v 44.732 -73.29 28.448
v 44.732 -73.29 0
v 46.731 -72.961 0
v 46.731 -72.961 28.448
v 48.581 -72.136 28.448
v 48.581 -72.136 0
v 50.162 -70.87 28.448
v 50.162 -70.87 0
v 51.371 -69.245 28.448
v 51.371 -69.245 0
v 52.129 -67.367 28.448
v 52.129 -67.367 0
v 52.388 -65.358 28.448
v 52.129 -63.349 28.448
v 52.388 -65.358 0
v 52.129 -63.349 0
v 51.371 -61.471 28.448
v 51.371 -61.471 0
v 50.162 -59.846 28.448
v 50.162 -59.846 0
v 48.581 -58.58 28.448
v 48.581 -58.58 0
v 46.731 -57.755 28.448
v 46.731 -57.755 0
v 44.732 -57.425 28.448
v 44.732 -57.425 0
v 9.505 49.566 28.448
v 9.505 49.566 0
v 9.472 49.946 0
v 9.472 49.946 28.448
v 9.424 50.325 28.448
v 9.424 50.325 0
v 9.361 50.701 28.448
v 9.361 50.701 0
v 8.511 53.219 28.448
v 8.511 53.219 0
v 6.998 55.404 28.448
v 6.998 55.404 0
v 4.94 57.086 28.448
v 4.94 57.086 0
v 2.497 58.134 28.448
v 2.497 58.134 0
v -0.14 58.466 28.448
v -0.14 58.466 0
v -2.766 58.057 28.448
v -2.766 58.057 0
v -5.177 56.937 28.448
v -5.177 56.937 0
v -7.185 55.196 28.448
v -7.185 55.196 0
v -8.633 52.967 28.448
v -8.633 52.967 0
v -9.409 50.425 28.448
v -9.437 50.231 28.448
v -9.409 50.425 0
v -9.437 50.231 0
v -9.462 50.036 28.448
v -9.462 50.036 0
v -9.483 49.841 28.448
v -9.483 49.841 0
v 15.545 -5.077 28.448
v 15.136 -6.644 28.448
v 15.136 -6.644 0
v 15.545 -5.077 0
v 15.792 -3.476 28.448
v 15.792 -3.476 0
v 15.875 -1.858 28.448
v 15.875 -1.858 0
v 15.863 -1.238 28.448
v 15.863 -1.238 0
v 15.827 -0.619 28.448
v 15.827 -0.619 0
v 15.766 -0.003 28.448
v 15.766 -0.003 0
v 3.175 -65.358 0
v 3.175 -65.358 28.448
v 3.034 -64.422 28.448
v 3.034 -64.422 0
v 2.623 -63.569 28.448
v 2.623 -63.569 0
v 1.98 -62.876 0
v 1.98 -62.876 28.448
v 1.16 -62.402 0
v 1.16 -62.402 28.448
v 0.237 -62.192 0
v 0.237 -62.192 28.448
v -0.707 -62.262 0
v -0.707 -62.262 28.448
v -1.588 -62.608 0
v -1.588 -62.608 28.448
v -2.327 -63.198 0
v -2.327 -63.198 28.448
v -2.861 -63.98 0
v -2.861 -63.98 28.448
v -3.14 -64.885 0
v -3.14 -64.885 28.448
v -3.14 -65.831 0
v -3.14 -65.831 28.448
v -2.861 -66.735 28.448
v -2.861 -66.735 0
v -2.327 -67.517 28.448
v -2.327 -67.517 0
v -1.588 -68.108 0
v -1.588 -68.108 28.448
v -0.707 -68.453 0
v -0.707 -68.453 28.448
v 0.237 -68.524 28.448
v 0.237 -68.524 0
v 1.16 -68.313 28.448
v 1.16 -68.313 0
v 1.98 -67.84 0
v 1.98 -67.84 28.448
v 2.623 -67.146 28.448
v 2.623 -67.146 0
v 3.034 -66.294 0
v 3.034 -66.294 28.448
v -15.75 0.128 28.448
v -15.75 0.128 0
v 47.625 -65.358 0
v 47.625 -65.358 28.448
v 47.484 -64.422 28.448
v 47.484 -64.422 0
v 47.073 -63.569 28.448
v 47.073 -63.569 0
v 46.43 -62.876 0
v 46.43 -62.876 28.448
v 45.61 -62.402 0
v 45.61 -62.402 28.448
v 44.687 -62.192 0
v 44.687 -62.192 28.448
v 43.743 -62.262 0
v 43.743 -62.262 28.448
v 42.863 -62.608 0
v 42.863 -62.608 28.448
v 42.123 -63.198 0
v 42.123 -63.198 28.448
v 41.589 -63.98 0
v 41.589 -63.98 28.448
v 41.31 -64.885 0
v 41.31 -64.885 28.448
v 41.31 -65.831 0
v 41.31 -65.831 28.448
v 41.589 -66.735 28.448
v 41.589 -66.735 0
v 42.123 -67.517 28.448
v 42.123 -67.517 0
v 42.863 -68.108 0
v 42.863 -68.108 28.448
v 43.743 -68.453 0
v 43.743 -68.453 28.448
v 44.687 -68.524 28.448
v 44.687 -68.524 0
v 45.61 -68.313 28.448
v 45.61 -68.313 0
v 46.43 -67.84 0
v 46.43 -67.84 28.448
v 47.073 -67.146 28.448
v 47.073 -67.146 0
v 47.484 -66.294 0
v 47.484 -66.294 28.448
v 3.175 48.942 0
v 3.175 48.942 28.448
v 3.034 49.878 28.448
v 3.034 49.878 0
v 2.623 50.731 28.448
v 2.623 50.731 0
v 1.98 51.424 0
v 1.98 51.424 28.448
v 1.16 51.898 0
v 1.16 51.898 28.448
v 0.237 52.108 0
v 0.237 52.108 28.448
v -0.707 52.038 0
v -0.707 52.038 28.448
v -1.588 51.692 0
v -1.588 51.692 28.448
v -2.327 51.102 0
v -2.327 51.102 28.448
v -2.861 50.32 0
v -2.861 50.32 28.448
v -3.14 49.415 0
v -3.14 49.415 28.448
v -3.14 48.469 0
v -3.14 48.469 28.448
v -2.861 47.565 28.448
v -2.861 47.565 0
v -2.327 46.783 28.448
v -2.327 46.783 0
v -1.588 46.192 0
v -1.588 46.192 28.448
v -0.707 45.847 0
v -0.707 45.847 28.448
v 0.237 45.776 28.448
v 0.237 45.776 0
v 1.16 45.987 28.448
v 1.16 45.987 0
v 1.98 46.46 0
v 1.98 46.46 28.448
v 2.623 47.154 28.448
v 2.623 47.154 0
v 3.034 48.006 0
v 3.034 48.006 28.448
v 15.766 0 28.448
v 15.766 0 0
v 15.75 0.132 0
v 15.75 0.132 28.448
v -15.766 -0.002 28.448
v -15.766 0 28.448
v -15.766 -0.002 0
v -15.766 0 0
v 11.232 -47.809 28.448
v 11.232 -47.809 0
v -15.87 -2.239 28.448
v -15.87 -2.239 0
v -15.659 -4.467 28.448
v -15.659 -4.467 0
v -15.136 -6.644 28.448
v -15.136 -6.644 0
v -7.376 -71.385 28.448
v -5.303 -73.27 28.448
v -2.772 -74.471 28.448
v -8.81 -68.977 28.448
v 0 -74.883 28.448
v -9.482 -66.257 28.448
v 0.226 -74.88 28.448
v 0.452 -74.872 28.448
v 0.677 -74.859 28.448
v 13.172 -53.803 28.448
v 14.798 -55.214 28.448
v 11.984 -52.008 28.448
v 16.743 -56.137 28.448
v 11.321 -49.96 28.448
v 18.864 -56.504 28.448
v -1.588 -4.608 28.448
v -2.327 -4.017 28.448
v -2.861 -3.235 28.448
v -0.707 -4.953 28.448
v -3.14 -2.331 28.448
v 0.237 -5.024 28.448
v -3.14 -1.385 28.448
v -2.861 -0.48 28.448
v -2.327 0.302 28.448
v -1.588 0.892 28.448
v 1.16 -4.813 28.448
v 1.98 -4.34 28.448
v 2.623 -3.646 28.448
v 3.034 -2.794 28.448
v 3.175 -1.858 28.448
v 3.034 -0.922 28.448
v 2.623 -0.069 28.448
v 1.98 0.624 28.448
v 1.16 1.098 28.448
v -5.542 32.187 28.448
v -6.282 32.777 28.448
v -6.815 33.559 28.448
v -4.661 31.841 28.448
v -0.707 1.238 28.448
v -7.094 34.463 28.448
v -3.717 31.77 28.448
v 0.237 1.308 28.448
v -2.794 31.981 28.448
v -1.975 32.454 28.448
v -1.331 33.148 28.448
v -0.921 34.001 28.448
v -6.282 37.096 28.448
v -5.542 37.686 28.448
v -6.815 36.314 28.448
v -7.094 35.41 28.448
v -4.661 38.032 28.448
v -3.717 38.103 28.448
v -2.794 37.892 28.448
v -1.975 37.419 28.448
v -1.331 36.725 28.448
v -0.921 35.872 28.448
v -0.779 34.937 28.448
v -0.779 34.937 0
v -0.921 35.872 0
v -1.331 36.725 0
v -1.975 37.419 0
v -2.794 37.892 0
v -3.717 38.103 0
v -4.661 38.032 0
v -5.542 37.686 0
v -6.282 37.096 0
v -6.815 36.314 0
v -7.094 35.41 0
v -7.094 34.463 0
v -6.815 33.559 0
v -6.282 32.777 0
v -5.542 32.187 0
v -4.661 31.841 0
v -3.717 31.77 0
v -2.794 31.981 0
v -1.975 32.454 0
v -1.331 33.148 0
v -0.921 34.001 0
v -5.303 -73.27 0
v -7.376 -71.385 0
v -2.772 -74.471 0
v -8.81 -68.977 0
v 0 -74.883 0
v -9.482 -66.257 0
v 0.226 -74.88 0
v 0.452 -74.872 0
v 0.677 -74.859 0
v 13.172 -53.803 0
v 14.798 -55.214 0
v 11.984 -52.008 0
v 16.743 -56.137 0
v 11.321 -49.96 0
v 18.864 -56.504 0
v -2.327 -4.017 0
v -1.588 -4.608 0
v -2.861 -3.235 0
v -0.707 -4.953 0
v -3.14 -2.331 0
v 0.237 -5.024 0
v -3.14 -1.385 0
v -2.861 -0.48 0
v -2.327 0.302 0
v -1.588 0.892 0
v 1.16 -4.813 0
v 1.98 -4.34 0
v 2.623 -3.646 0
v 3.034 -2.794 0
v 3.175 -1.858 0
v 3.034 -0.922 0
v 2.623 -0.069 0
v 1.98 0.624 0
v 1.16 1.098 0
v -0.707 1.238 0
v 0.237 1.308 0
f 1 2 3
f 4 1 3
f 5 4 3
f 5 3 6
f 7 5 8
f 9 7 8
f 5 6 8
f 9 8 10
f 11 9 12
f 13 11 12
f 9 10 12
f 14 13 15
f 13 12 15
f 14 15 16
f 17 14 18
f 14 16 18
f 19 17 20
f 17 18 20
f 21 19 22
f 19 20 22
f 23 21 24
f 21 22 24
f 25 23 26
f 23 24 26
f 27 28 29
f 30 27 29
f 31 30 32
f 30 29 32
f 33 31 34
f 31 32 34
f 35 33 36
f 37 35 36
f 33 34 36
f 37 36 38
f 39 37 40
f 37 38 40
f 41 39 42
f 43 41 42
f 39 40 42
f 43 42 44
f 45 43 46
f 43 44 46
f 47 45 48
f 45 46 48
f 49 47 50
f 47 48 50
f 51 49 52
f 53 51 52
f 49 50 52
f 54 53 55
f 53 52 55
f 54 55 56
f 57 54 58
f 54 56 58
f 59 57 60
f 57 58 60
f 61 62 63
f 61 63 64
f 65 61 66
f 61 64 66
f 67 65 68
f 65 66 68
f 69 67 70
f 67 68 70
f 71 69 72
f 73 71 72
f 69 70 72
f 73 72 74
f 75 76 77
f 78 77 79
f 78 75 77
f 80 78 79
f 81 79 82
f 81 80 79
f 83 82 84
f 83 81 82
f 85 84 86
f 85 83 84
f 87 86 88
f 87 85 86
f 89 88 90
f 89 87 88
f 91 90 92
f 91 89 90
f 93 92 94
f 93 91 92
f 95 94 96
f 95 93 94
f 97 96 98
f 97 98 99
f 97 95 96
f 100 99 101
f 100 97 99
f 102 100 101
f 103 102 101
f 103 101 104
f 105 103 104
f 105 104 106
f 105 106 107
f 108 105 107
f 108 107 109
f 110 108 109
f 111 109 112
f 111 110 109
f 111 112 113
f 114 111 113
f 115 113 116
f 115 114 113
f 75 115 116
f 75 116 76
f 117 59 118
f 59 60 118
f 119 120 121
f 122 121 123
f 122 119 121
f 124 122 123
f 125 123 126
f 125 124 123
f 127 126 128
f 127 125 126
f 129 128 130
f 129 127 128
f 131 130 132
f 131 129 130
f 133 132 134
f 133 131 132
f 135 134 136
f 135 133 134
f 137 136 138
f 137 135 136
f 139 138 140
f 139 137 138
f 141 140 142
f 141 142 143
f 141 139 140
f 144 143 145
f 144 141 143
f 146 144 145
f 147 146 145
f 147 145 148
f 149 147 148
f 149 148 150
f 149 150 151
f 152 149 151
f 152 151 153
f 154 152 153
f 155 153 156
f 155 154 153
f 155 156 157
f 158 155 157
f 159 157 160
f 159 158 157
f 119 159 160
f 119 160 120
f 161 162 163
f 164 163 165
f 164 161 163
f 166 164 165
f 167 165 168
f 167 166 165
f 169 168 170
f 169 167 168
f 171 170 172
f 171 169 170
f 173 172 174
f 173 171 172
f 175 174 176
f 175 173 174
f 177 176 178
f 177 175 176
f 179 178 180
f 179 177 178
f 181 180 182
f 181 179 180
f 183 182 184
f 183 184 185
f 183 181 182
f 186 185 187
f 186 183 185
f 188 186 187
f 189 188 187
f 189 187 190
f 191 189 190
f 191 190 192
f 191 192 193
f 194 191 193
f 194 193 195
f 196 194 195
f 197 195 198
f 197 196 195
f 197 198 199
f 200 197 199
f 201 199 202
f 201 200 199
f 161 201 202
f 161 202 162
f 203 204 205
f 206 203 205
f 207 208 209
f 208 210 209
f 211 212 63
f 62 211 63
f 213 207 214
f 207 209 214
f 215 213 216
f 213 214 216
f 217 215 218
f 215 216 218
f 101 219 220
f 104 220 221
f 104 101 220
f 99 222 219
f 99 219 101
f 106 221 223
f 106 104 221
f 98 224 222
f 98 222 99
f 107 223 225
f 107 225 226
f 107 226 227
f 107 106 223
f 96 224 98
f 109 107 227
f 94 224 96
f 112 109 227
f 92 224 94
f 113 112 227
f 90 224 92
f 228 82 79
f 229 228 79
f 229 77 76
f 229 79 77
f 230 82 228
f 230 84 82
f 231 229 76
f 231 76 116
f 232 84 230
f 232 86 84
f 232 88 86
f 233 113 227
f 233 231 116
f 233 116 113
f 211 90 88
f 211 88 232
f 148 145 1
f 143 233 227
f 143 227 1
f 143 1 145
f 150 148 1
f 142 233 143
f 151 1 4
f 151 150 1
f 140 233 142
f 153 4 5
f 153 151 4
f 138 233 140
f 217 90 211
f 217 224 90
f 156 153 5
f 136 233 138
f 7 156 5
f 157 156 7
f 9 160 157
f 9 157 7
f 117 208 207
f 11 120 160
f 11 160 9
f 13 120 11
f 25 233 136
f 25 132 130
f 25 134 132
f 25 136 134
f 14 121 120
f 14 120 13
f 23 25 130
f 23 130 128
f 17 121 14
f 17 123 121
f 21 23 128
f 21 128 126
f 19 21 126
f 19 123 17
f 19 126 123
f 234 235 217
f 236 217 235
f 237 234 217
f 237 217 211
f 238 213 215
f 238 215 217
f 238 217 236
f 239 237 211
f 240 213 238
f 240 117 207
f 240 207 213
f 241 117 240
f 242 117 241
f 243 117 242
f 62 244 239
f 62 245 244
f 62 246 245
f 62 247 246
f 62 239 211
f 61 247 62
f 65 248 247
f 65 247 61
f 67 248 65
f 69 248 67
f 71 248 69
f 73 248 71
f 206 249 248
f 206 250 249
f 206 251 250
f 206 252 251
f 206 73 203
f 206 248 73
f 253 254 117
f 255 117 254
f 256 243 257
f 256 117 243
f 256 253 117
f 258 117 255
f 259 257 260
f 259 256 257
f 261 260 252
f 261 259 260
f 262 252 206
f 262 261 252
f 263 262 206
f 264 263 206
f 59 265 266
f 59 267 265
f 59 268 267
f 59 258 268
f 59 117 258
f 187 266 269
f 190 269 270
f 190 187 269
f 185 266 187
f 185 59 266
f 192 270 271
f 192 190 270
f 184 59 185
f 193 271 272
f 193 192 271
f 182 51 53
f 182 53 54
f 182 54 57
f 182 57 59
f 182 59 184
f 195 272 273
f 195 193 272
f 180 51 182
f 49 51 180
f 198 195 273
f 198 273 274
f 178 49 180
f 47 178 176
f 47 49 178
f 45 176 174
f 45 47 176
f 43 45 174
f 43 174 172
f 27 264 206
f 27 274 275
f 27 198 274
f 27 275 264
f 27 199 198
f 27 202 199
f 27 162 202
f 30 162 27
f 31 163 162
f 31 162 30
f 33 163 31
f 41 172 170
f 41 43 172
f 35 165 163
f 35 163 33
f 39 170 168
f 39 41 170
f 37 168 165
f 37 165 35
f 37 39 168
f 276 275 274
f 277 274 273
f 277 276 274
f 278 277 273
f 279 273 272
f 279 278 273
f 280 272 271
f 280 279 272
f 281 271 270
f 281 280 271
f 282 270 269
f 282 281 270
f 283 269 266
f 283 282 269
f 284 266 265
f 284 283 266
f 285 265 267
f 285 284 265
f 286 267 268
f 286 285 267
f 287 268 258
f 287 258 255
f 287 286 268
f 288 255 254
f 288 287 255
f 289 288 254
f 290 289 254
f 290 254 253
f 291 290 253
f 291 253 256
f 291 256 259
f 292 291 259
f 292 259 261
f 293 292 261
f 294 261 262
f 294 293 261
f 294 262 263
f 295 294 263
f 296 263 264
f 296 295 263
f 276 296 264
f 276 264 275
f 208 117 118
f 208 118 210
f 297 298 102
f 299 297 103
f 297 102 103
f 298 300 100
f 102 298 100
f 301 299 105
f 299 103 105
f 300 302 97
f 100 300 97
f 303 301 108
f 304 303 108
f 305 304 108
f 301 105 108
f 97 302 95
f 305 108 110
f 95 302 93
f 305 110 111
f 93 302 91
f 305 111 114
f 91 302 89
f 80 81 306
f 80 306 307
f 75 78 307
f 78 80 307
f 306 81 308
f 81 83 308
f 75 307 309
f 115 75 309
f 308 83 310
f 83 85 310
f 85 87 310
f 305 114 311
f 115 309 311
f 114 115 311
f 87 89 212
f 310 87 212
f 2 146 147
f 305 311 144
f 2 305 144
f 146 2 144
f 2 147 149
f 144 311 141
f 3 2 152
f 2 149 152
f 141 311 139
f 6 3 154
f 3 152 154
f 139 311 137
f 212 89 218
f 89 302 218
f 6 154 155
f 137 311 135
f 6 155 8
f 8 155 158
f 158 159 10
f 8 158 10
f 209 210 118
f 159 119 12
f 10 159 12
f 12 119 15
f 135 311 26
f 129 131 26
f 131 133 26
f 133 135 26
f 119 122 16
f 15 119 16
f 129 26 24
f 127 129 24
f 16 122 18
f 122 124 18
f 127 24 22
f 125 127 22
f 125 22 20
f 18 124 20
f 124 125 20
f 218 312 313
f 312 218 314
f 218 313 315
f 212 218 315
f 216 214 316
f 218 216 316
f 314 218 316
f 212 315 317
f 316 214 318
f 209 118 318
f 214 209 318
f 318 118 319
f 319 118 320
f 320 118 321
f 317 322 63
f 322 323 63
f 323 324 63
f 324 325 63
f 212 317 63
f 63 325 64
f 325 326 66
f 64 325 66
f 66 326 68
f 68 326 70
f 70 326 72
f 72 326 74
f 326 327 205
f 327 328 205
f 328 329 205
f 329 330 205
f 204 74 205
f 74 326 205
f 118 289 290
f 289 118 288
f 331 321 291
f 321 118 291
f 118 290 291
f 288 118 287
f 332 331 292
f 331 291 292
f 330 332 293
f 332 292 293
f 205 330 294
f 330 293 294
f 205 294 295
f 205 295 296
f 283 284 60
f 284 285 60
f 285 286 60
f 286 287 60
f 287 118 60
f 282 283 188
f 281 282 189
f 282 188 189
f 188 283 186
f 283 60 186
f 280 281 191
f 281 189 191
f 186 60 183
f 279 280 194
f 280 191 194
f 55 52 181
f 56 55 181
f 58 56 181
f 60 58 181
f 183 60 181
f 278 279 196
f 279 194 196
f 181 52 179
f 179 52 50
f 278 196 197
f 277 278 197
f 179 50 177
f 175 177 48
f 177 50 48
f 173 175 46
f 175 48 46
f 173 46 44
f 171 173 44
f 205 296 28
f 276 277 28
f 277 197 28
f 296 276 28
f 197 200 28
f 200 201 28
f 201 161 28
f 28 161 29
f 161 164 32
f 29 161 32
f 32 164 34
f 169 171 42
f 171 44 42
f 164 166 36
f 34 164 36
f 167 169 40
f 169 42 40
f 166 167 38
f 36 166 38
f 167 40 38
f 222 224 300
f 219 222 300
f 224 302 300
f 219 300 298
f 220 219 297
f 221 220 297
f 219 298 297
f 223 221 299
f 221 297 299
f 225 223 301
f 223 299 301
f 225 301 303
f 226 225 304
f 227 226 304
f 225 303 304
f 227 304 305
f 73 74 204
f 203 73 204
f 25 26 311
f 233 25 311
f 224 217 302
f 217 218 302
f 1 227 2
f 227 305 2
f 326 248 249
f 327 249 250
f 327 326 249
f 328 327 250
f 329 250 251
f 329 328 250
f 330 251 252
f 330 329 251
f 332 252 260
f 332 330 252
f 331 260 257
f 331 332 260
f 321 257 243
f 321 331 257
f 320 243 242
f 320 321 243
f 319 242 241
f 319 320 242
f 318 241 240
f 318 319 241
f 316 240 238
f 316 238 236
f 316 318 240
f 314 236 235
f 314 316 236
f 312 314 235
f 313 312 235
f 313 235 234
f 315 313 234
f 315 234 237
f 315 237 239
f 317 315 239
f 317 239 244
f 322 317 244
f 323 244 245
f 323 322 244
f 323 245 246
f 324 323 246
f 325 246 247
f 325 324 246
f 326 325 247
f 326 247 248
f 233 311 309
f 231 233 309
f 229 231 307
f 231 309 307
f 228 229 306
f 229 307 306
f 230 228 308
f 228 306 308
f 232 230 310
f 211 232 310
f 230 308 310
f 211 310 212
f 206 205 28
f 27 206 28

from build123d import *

# Parameters (mm, degrees)
F0_R     = 3.175
F1_DEPTH = 3.048
F2_DEPTH = 25.4


with BuildPart() as f1:
    # F0 (on Top) → F1 (new body)
    with BuildSketch(Plane.XY):
        with BuildLine():
            Line((9.5045213227, 49.566365397), (9.3611481588, 50.7012339615))
            ThreePointArc((9.3611481588, 50.7012339615), (-0.1400603656, 58.4660764801), (-9.4088285736, 50.4252009888))
            Line((-9.4088285736, 50.4252009888), (-9.4825060338, 49.840830011))
            ThreePointArc((-9.4825060338, 49.840830011), (-0.4498638837, 39.4277357171), (9.525, 48.9421062946))
            ThreePointArc((9.525, 48.9421062946), (9.519878954, 49.2544037502), (9.5045213227, 49.566365397))
        make_face()
        with Locations((0, 48.9421062946)):
            Circle(F0_R, mode=Mode.SUBTRACT)
        with BuildLine():
            ThreePointArc((9.5045213227, 49.566365397), (9.4498863967, 50.1359538934), (9.3611481588, 50.7012339615))
            Line((9.3611481588, 50.7012339615), (9.5045213227, 49.566365397))
        make_face()
        with BuildLine():
            Line((-9.4825060338, 49.840830011), (-9.4088285736, 50.4252009888))
            ThreePointArc((-9.4088285736, 50.4252009888), (-9.4501853512, 50.1335851351), (-9.4825060338, 49.840830011))
        make_face()
        with BuildLine():
            Line((15.7498106857, 0.1318520983), (9.5045213227, 49.566365397))
            ThreePointArc((9.5045213227, 49.566365397), (9.519878954, 49.2544037502), (9.525, 48.9421062946))
            ThreePointArc((9.525, 48.9421062946), (-0.4498638837, 39.4277357171), (-9.4825060338, 49.840830011))
            Line((-9.4825060338, 49.840830011), (-15.7503089228, 0.1279043299))
            ThreePointArc((-15.7503089228, 0.1279043299), (-0.0019895424, 14.01710617), (15.7498106857, 0.1318520983))
        make_face()
        with Locations((-3.9544538595, 34.9365547299)):
            Circle(F0_R, mode=Mode.SUBTRACT)
        with BuildLine():
            Line((15.7664681676, 0), (15.7498106857, 0.1318520983))
            ThreePointArc((15.7498106857, 0.1318520983), (15.7581579571, 0.0646262032), (15.7662182853, -0.0026346995))
            Line((15.7662182853, -0.0026346995), (15.7664681676, 0))
        make_face()
        with BuildLine():
            ThreePointArc((15.7662182853, -0.0026346995), (15.7581579571, 0.0646262032), (15.7498106857, 0.1318520983))
            ThreePointArc((15.7498106857, 0.1318520983), (-0.0019895424, 14.01710617), (-15.7503089228, 0.1279043299))
            ThreePointArc((-15.7503089228, 0.1279043299), (-15.7583892955, 0.0627290611), (-15.7661999721, -0.002479078))
            Line((-15.7661999721, -0.002479078), (-15.1362867475, -6.6441708073))
            ThreePointArc((-15.1362867475, -6.6441708073), (7.04938e-05, -17.7328937052), (15.1363292544, -6.64403638))
            Line((15.1363292544, -6.64403638), (15.7662182853, -0.0026346995))
        make_face()
        with Locations((0, -1.8578937054)):
            Circle(F0_R, mode=Mode.SUBTRACT)
        with BuildLine():
            ThreePointArc((-15.7661999721, -0.002479078), (-15.7583892955, 0.0627290611), (-15.7503089228, 0.1279043299))
            Line((-15.7503089228, 0.1279043299), (-15.7664350935, 0))
            Line((-15.7664350935, 0), (-15.7661999721, -0.002479078))
        make_face()
        with BuildLine():
            ThreePointArc((15.875, -1.8578937054), (15.8477812371, -0.9286709871), (15.7662182853, -0.0026346995))
            Line((15.7662182853, -0.0026346995), (15.1363292544, -6.64403638))
            ThreePointArc((15.1363292544, -6.64403638), (15.6892455509, -4.2792980589), (15.875, -1.8578937054))
        make_face()
        with BuildLine():
            Line((-15.1362867475, -6.6441708073), (-15.7661999721, -0.002479078))
            ThreePointArc((-15.7661999721, -0.002479078), (-15.8040798094, -3.356788758), (-15.1362867475, -6.6441708073))
        make_face()
        with BuildLine():
            Line((11.2321620564, -47.8086563632), (15.1363292544, -6.64403638))
            ThreePointArc((15.1363292544, -6.64403638), (7.04938e-05, -17.7328937052), (-15.1362867475, -6.6441708073))
            Line((-15.1362867475, -6.6441708073), (-9.4824478856, -66.257230737))
            ThreePointArc((-9.4824478856, -66.257230737), (-0.4501715725, -55.8435376812), (9.525, -65.3578937054))
            ThreePointArc((9.525, -65.3578937054), (6.9705567315, -71.8491927936), (0.6773435479, -74.8587794913))
            Line((0.6773435479, -74.8587794913), (44.7324052746, -73.2903683199))
            ThreePointArc((44.7324052746, -73.2903683199), (36.5125, -65.3578937054), (44.7324052746, -57.4254190908))
            Line((44.7324052746, -57.4254190908), (18.8639877306, -56.5044734952))
            ThreePointArc((18.8639877306, -56.5044734952), (13.1715436826, -53.8034899802), (11.2321620564, -47.8086563632))
        make_face()
        with BuildLine():
            ThreePointArc((9.525, -65.3578937054), (-0.4501715725, -55.8435376812), (-9.4824478856, -66.257230737))
            ThreePointArc((-9.4824478856, -66.257230737), (-6.4093462917, -72.4038787403), (0, -74.8828937054))
            Line((0, -74.8828937054), (0.6773435479, -74.8587794913))
            ThreePointArc((0.6773435479, -74.8587794913), (6.9705567315, -71.8491927936), (9.525, -65.3578937054))
        make_face()
        with Locations((0, -65.3578937054)):
            Circle(F0_R, mode=Mode.SUBTRACT)
        with BuildLine():
            Line((0.6773435479, -74.8587794913), (0, -74.8828937054))
            ThreePointArc((0, -74.8828937054), (0.3388863295, -74.8768632429), (0.6773435479, -74.8587794913))
        make_face()
        with BuildLine():
            ThreePointArc((52.3875, -65.3578937054), (50.1616327839, -59.8459832206), (44.7324052746, -57.4254190908))
            ThreePointArc((44.7324052746, -57.4254190908), (36.5125, -65.3578937054), (44.7324052746, -73.2903683199))
            ThreePointArc((44.7324052746, -73.2903683199), (50.1616327839, -70.8698041901), (52.3875, -65.3578937054))
        make_face()
        with Locations((44.45, -65.3578937054)):
            Circle(F0_R, mode=Mode.SUBTRACT)
    extrude(amount=F1_DEPTH)

    # F2 (add): a face of the model
    f2_faces = [f1.faces().sort_by_distance(p)[0] for p in [
        (5.2288059098, -18.6652574554, 3.048),
    ]]
    extrude(f2_faces, amount=F2_DEPTH)


solid = f1.part
